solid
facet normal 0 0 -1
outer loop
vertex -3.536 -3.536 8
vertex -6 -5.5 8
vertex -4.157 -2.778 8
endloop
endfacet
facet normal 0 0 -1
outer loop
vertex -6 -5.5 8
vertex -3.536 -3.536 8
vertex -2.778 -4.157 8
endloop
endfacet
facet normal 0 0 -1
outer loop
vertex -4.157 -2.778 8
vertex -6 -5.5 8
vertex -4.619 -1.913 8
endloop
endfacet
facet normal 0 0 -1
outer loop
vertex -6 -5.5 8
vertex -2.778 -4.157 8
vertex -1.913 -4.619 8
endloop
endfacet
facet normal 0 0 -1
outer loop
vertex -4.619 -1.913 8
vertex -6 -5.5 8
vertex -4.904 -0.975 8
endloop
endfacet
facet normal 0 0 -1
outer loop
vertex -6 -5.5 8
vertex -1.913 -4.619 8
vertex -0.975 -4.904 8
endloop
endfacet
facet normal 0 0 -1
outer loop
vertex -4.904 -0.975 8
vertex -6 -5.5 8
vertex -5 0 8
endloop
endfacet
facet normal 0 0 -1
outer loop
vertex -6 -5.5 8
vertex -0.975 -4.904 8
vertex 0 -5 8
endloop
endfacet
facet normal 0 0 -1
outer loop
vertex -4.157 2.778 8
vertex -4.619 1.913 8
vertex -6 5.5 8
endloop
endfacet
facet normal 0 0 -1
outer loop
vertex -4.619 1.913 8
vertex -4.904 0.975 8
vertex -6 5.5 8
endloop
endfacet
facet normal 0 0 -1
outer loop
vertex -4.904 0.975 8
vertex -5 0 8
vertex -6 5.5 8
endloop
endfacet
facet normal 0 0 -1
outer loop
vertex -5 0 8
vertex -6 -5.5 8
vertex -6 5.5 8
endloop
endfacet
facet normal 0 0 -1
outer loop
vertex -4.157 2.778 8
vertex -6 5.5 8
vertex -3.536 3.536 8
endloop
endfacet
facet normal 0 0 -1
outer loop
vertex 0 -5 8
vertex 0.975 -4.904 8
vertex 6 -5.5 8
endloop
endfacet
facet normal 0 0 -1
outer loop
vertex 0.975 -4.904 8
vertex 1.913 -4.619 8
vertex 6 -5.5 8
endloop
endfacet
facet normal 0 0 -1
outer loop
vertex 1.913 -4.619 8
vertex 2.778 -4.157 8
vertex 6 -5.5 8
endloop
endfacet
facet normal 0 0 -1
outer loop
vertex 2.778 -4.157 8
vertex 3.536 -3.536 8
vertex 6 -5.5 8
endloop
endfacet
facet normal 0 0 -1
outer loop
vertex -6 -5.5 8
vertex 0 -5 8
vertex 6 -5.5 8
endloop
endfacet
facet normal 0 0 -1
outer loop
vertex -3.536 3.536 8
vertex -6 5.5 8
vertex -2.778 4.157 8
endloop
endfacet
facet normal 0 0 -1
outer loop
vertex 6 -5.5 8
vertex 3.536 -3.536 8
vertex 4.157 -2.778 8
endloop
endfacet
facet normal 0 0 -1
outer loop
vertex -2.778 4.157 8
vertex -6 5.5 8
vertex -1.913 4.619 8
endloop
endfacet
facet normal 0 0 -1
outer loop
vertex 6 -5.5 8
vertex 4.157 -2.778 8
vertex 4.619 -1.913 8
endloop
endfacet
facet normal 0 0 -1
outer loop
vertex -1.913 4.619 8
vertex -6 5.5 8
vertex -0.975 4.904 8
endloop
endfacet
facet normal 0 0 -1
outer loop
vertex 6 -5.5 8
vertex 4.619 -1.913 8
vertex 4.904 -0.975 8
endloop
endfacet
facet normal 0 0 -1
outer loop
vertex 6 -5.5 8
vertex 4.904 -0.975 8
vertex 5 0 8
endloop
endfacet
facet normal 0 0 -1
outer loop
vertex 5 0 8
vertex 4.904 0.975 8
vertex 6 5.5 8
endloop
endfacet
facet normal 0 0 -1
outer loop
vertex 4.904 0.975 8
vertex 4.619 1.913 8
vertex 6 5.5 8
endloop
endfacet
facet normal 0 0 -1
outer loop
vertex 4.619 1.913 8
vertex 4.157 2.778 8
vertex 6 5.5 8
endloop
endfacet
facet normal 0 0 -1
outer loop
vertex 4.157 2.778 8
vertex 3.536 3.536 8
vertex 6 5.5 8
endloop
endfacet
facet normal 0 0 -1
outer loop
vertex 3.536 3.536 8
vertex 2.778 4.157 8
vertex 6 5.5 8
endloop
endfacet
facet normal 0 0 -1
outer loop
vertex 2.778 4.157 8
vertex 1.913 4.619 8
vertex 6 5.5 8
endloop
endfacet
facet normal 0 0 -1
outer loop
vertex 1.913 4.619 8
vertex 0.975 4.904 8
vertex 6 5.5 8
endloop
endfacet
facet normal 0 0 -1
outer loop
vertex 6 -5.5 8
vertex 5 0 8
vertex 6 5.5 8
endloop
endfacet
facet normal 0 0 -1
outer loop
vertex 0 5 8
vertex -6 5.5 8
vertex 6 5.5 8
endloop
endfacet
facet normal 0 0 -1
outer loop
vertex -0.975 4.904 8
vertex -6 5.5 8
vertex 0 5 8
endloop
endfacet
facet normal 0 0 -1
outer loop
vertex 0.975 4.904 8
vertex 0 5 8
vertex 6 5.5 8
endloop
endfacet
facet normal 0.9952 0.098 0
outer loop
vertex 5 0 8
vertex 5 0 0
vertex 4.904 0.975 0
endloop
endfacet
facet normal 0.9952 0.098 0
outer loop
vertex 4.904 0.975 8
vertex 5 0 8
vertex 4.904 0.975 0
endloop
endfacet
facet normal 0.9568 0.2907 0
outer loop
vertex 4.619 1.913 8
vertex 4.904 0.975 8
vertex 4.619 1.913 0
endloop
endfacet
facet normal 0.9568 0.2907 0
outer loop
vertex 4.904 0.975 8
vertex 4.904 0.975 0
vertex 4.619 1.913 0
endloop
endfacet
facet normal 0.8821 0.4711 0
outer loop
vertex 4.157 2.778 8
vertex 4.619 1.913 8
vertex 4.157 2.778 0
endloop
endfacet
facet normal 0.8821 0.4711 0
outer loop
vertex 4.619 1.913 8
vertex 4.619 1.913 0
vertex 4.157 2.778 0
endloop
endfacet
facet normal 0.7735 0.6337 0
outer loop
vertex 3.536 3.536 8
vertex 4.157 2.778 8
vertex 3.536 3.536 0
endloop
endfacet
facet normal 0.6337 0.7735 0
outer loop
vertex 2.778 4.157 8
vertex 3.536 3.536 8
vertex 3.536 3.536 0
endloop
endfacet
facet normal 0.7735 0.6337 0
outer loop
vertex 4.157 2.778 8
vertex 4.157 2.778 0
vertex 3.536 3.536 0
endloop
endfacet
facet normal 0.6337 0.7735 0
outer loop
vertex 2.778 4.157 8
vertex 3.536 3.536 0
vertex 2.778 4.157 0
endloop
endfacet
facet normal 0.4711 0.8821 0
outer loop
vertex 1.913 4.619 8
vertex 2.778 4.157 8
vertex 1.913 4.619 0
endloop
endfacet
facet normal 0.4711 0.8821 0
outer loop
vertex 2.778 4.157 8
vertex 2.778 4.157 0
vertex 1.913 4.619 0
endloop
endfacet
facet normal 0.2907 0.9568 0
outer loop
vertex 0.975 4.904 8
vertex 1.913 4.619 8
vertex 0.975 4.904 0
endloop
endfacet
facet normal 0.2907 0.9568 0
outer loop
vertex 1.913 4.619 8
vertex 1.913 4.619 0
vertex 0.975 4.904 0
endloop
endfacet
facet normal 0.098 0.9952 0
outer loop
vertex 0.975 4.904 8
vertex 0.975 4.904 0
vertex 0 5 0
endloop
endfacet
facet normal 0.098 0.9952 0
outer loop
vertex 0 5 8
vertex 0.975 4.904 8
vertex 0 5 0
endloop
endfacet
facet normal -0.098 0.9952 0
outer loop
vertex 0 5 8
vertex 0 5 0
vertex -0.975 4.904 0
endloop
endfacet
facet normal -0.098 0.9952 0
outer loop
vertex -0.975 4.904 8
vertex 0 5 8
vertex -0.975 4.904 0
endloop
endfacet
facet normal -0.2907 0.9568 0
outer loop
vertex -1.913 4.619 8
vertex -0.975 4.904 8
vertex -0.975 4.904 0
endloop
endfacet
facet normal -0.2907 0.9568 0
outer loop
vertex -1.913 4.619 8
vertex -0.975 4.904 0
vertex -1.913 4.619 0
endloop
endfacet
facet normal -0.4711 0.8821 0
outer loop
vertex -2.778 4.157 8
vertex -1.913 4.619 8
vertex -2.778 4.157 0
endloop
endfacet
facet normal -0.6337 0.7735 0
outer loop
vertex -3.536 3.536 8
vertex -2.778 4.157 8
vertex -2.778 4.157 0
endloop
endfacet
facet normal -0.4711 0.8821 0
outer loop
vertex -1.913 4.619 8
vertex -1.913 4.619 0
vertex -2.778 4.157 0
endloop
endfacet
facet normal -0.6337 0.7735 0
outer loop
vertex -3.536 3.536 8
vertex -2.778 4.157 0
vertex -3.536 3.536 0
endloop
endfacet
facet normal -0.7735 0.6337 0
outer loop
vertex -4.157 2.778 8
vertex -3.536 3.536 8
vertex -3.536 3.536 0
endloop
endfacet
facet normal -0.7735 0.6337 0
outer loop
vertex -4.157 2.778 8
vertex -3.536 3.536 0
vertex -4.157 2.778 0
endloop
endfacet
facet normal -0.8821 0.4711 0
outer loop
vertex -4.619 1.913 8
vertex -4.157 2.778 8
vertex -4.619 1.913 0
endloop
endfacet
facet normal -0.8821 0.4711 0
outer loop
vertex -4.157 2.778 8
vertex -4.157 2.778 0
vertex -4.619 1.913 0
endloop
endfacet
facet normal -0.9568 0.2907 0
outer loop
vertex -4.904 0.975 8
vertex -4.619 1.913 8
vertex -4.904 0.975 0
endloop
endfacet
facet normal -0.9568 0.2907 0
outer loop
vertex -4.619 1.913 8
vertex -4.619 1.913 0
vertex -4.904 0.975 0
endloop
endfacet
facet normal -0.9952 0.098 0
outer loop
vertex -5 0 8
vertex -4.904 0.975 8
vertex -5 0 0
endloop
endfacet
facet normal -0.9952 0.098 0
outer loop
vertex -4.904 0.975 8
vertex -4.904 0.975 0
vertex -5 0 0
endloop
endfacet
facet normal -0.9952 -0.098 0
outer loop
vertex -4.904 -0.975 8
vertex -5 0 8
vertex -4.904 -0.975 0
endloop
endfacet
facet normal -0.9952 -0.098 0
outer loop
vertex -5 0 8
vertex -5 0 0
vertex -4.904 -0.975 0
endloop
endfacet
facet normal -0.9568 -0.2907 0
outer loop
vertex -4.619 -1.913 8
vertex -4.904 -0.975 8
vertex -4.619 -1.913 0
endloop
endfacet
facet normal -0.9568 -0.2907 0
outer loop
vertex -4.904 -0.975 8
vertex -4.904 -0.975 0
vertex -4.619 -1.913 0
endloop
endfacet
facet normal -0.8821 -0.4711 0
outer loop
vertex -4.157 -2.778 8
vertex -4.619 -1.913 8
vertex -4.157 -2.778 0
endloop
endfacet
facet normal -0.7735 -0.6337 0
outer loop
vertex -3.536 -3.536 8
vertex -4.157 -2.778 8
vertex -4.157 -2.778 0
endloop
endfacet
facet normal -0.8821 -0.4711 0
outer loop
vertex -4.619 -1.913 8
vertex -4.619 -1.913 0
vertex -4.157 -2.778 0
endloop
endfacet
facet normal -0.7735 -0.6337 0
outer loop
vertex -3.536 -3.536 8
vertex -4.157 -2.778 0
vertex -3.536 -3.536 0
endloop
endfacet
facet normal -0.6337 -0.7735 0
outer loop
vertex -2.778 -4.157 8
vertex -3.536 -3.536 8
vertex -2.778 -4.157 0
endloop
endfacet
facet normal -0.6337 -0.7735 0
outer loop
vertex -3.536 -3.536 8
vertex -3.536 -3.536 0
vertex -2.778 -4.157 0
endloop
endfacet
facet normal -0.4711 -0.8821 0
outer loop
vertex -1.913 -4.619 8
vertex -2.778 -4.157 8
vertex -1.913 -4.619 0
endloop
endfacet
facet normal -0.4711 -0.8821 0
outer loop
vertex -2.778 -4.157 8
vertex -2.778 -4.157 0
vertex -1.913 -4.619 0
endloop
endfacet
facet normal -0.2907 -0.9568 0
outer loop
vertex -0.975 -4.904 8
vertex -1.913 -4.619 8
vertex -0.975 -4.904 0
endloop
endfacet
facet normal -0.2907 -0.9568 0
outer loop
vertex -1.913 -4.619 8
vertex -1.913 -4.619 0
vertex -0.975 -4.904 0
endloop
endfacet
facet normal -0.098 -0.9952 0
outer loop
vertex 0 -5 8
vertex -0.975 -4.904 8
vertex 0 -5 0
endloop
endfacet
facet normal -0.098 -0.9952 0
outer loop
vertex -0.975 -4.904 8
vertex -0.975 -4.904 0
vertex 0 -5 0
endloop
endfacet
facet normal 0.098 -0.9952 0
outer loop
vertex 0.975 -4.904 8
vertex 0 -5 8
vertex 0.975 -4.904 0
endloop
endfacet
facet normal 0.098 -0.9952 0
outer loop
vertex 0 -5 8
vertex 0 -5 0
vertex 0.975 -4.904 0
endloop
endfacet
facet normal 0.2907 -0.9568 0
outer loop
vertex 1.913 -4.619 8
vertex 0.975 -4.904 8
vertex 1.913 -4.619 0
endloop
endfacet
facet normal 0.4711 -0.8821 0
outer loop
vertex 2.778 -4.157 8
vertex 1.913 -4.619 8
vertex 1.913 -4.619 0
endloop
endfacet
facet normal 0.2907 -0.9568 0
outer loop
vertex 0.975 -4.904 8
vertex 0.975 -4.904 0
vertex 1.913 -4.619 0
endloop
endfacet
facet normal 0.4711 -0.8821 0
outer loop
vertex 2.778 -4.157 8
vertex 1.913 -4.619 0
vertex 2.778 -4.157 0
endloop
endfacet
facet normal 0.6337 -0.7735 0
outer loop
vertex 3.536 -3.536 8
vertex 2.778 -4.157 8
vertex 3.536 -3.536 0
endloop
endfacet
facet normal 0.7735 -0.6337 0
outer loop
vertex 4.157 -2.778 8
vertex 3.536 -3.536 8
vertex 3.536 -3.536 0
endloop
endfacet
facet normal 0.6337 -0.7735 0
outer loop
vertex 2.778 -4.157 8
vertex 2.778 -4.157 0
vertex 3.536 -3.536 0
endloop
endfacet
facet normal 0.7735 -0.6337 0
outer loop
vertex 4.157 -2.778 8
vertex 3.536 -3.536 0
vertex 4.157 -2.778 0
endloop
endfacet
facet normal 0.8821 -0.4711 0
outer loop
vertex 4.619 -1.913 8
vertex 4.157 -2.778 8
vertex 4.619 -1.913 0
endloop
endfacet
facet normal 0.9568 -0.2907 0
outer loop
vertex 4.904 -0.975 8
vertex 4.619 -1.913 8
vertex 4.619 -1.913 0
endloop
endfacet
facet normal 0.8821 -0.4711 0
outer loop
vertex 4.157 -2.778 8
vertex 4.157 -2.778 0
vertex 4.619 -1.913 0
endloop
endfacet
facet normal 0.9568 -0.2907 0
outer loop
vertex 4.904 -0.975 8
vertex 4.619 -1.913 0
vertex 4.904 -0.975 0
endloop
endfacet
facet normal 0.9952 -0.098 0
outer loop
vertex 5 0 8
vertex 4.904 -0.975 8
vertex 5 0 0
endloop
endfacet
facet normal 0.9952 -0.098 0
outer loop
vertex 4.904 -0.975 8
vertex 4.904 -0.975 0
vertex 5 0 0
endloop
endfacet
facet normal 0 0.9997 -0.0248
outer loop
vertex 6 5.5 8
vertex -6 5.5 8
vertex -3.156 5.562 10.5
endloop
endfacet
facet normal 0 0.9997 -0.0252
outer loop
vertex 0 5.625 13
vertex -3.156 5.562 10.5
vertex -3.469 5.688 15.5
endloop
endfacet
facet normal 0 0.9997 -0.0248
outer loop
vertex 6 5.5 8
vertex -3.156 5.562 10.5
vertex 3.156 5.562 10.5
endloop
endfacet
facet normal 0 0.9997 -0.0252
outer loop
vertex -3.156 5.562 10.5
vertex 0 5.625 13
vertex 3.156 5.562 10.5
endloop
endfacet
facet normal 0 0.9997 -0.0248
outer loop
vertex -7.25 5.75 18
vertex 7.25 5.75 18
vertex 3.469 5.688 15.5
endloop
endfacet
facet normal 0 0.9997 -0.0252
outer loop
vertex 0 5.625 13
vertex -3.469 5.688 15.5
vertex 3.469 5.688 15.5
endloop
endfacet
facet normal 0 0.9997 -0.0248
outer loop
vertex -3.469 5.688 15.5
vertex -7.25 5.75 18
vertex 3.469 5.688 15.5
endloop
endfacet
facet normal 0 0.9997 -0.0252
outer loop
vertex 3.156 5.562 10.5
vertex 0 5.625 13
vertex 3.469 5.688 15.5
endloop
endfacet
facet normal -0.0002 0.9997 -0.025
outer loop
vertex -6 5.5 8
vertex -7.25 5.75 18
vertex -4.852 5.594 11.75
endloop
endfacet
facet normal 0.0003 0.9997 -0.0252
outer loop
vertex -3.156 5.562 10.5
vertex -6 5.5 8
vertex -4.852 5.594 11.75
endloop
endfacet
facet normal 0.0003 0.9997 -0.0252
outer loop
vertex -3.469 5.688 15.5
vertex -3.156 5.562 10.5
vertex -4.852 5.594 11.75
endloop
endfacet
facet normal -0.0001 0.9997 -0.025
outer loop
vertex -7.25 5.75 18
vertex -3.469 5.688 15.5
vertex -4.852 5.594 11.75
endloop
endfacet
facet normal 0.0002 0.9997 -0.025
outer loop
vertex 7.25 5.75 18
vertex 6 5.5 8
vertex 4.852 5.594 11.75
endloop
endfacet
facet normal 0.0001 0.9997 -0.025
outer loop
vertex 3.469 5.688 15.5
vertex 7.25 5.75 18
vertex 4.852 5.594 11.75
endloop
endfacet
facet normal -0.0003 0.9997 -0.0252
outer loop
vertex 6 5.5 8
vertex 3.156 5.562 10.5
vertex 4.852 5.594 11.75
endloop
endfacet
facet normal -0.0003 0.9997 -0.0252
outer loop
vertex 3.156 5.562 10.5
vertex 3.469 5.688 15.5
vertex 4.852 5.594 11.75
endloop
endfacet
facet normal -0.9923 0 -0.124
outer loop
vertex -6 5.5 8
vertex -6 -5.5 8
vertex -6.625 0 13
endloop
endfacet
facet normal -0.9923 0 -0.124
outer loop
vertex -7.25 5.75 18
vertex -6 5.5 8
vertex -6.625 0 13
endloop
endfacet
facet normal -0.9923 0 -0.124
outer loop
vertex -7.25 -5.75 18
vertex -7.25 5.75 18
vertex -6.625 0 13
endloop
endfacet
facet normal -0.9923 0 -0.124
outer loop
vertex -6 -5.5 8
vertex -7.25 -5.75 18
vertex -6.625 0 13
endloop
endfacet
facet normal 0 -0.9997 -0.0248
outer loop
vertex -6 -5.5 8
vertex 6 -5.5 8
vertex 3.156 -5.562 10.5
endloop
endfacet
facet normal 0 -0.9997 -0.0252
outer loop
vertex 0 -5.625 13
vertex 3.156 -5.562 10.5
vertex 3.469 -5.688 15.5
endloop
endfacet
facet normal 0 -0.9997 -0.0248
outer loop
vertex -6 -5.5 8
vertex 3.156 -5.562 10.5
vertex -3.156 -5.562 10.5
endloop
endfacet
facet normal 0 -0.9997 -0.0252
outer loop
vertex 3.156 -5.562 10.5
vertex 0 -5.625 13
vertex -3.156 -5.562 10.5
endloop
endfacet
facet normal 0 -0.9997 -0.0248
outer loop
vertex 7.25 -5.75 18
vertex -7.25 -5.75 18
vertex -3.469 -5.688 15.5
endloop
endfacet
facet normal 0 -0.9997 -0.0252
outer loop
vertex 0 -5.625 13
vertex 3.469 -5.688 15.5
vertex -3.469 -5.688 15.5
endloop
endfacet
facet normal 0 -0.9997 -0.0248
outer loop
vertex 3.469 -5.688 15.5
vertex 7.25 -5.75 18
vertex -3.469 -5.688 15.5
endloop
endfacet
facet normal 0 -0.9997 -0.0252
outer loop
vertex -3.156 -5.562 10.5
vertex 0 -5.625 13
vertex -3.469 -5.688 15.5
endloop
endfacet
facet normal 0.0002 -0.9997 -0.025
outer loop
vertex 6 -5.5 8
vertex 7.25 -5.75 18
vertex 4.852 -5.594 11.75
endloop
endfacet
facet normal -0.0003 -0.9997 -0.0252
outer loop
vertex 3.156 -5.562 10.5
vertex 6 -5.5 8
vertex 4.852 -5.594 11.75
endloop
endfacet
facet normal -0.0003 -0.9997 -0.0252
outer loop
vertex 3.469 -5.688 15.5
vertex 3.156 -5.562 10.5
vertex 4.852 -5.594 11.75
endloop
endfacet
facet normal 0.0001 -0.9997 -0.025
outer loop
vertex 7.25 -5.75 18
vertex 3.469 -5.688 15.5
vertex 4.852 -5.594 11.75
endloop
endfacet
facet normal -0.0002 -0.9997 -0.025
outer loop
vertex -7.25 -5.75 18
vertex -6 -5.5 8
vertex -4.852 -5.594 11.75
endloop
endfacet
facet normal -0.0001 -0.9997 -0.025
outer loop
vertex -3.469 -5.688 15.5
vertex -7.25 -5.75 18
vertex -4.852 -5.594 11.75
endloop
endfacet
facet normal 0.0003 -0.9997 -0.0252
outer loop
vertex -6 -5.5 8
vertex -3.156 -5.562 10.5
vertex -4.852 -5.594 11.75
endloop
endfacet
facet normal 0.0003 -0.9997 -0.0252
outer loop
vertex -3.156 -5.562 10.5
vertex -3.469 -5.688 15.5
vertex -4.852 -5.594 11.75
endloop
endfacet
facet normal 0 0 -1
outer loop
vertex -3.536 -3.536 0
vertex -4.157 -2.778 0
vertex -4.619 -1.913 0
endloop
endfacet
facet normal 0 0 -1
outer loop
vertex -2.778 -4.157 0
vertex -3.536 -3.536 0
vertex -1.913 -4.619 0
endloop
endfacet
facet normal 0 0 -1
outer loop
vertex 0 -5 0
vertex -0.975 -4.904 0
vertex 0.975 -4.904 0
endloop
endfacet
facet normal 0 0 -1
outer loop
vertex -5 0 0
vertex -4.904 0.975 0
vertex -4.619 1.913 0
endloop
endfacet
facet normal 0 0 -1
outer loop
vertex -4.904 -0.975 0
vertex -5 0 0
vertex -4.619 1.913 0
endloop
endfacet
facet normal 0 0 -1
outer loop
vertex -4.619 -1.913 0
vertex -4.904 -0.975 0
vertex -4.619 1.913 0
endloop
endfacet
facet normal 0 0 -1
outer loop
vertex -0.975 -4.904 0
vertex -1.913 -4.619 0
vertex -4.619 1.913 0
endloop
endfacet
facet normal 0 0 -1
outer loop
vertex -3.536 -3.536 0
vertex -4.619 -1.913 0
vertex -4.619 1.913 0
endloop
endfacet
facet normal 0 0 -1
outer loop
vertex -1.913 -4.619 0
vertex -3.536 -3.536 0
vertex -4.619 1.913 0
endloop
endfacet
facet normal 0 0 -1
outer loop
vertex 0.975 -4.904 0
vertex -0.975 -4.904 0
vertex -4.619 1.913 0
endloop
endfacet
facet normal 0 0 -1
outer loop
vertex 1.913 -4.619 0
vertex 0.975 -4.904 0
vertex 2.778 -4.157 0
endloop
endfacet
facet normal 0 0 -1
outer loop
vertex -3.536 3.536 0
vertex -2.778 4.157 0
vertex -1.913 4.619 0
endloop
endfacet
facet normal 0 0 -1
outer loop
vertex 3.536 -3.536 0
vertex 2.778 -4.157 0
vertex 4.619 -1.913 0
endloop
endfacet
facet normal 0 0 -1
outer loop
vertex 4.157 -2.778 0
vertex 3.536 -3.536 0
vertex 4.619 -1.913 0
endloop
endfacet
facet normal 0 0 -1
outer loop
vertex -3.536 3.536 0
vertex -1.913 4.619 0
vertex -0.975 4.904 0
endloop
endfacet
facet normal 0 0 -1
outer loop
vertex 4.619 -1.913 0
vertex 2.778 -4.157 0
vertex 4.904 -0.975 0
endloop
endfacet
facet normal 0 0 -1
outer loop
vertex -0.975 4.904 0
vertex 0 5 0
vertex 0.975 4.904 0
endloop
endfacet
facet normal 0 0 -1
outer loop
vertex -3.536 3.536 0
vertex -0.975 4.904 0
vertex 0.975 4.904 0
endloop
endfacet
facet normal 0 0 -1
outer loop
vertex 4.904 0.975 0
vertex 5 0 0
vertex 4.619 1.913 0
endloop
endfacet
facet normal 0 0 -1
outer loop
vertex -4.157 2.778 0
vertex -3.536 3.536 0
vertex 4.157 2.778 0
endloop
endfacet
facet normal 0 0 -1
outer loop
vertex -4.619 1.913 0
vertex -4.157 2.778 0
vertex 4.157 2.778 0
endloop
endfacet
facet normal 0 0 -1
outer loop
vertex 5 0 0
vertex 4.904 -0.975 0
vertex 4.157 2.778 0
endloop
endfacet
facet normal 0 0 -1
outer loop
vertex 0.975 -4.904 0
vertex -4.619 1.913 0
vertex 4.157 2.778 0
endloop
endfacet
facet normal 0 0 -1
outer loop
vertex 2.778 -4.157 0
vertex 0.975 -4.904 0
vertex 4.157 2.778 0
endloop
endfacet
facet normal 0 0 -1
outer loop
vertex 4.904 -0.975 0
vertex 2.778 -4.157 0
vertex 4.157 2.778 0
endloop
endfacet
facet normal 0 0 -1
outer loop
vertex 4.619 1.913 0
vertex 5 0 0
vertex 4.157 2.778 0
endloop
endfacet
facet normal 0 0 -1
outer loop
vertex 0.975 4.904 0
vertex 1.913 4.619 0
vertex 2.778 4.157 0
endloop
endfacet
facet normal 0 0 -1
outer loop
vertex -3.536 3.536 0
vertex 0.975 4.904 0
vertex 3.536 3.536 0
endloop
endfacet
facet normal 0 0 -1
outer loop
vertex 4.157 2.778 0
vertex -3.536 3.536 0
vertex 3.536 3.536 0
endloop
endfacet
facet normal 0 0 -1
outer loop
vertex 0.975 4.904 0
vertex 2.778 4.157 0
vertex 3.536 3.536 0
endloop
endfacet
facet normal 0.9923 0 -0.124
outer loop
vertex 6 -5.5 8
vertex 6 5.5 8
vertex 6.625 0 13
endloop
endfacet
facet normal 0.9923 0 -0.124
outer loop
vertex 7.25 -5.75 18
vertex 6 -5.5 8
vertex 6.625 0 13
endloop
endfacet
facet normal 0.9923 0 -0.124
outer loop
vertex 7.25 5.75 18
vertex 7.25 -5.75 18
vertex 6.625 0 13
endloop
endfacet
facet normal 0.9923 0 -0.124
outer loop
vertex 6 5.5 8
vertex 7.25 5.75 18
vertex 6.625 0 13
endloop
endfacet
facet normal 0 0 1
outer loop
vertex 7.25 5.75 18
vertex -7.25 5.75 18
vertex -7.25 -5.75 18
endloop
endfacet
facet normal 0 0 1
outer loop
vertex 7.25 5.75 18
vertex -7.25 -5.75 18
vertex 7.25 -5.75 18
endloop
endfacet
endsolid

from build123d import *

# Parameters (mm, degrees)
SKETCH1_R           = 5
BOSS_EXTRUDE1_DEPTH = 8
SKETCH2_W           = 12
SKETCH2_H           = 11
BOSS_EXTRUDE2_DEPTH = 10


with BuildPart() as part:
    # Sketch1 → Boss-Extrude1 (new body)
    with BuildSketch(Plane.XY):
        Circle(SKETCH1_R)
    extrude(amount=BOSS_EXTRUDE1_DEPTH)

    # Sketch2 → Boss-Extrude2 (add)
    with BuildSketch(Plane.XY.offset(8)):
        Rectangle(SKETCH2_W, SKETCH2_H)
    extrude(amount=BOSS_EXTRUDE2_DEPTH)

    # Sketch3 → Loft1 section 0
    with BuildSketch(Plane(origin=(0, 0, 8), x_dir=(-1, 0, 0), z_dir=(0, 0, -1))):
        with BuildLine():
            Line((6, -5.5), (6, 5.5))
            Line((6, 5.5), (-6, 5.5))
            Line((-6, 5.5), (-6, -5.5))
            Line((-6, -5.5), (6, -5.5))
        make_face()
    # Sketch4 → Loft1 section 1
    with BuildSketch(Plane.XY.offset(18)):
        with BuildLine():
            Line((7.25, -5.75), (-7.25, -5.75))
            Line((-7.25, -5.75), (-7.25, 5.75))
            Line((-7.25, 5.75), (7.25, 5.75))
            Line((7.25, 5.75), (7.25, -5.75))
        make_face()
    loft()


solid = part.part
